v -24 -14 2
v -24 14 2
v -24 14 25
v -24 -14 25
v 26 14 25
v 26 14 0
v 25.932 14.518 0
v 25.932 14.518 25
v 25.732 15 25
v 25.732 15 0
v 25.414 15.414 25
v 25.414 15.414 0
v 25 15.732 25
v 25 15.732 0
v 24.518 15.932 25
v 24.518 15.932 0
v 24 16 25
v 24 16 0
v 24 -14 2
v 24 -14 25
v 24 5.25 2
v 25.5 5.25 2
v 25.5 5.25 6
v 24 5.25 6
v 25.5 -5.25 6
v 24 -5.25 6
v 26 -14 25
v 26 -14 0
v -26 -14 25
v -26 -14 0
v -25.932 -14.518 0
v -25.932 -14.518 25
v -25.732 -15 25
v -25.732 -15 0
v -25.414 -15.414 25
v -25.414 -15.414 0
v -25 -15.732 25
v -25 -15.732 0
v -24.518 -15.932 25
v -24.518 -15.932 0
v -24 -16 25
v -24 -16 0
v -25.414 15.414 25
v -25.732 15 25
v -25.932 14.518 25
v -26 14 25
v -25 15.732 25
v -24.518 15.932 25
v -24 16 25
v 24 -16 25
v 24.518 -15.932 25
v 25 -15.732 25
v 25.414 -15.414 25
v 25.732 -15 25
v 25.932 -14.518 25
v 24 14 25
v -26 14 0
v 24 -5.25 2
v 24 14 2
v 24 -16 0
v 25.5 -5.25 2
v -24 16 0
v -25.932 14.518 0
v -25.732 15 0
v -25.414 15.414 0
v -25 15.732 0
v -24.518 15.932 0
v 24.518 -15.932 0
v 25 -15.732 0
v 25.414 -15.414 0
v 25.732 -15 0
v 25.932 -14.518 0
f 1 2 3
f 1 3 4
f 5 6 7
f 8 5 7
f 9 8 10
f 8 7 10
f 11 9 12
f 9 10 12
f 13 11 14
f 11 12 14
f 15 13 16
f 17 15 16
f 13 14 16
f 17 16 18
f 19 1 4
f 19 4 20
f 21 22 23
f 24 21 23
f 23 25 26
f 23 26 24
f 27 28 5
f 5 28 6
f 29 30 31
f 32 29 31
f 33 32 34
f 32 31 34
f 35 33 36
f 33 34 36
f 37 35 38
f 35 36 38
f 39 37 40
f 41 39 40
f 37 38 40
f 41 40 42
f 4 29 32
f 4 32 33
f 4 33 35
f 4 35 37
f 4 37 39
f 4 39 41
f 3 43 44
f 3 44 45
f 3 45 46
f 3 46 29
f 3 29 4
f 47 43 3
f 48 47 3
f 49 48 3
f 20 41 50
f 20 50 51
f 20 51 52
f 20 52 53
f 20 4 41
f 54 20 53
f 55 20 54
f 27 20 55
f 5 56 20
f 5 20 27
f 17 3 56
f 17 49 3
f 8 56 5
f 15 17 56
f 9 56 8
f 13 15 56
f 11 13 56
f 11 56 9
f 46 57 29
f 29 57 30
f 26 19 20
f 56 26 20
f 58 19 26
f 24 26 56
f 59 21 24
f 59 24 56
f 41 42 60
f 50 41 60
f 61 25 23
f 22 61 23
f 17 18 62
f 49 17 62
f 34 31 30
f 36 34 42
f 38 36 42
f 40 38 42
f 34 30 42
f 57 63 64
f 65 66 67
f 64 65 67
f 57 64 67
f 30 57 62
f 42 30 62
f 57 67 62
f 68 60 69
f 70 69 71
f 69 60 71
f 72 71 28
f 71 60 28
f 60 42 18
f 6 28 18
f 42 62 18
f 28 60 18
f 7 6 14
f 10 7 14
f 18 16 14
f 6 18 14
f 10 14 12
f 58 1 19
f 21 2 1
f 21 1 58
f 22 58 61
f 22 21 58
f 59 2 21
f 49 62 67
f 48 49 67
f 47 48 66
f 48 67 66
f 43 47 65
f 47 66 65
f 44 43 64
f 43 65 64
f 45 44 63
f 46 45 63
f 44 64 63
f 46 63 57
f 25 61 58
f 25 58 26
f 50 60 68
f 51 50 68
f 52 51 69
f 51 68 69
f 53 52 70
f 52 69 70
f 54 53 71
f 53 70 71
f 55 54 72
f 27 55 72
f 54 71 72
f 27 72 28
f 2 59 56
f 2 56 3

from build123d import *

# Parameters (mm, degrees)
F1_DEPTH = 25
F2_T     = 2
F4_W     = 10.5
F4_H     = 4
F5_DEPTH = 3


# Not quite as in the source:
# - a shell that OpenCascade refuses in one call is made with other operations: the cavity is built on its own and cut out


with BuildPart() as f1:
    # F0 (on Top) → F1 (new body)
    with BuildSketch(Plane.XY):
        with BuildLine():
            Line((24, 16), (-24, 16))
            ThreePointArc((-24, 16), (-25.4142135624, 15.4142135624), (-26, 14))
            Line((-26, 14), (-26, -14))
            ThreePointArc((-26, -14), (-25.4142135624, -15.4142135624), (-24, -16))
            Line((-24, -16), (24, -16))
            ThreePointArc((24, -16), (25.4142135624, -15.4142135624), (26, -14))
            Line((26, -14), (26, 14))
            ThreePointArc((26, 14), (25.4142135624, 15.4142135624), (24, 16))
        make_face()
    extrude(amount=F1_DEPTH)

    # F2: shell of thickness 2, made by hand


with BuildPart() as f2_core1:
    # F2_t2: copy of F1
    add(f1.part)

    # the walls: a layer under each face that stays
    f2_faces = [f2_core1.faces().sort_by_distance(p)[0] for p in [
        (0, 16, 12.5),
        (-26, 0, 12.5),
        (0, -16, 12.5),
        (26, 0, 12.5),
        (0, 0, 0),
    ]]
    thicken(f2_faces, amount=-F2_T, mode=Mode.SUBTRACT)


with BuildPart() as f1_1:
    add(f1.part)

    # what is left inside the walls is the cavity
    f2_cavity = [f2_core1.part.solids().sort_by_distance(p)[0] for p in [
        (0, -4.666667, 2.02),
    ]]
    add(f2_cavity, mode=Mode.SUBTRACT)

    # F4 (on offset) → F5 (cut)
    with BuildSketch(Plane.YZ.offset(25.5)):
        with Locations((0, 4)):
            Rectangle(F4_W, F4_H)
    extrude(amount=-F5_DEPTH, mode=Mode.SUBTRACT)


solid = f1_1.part
